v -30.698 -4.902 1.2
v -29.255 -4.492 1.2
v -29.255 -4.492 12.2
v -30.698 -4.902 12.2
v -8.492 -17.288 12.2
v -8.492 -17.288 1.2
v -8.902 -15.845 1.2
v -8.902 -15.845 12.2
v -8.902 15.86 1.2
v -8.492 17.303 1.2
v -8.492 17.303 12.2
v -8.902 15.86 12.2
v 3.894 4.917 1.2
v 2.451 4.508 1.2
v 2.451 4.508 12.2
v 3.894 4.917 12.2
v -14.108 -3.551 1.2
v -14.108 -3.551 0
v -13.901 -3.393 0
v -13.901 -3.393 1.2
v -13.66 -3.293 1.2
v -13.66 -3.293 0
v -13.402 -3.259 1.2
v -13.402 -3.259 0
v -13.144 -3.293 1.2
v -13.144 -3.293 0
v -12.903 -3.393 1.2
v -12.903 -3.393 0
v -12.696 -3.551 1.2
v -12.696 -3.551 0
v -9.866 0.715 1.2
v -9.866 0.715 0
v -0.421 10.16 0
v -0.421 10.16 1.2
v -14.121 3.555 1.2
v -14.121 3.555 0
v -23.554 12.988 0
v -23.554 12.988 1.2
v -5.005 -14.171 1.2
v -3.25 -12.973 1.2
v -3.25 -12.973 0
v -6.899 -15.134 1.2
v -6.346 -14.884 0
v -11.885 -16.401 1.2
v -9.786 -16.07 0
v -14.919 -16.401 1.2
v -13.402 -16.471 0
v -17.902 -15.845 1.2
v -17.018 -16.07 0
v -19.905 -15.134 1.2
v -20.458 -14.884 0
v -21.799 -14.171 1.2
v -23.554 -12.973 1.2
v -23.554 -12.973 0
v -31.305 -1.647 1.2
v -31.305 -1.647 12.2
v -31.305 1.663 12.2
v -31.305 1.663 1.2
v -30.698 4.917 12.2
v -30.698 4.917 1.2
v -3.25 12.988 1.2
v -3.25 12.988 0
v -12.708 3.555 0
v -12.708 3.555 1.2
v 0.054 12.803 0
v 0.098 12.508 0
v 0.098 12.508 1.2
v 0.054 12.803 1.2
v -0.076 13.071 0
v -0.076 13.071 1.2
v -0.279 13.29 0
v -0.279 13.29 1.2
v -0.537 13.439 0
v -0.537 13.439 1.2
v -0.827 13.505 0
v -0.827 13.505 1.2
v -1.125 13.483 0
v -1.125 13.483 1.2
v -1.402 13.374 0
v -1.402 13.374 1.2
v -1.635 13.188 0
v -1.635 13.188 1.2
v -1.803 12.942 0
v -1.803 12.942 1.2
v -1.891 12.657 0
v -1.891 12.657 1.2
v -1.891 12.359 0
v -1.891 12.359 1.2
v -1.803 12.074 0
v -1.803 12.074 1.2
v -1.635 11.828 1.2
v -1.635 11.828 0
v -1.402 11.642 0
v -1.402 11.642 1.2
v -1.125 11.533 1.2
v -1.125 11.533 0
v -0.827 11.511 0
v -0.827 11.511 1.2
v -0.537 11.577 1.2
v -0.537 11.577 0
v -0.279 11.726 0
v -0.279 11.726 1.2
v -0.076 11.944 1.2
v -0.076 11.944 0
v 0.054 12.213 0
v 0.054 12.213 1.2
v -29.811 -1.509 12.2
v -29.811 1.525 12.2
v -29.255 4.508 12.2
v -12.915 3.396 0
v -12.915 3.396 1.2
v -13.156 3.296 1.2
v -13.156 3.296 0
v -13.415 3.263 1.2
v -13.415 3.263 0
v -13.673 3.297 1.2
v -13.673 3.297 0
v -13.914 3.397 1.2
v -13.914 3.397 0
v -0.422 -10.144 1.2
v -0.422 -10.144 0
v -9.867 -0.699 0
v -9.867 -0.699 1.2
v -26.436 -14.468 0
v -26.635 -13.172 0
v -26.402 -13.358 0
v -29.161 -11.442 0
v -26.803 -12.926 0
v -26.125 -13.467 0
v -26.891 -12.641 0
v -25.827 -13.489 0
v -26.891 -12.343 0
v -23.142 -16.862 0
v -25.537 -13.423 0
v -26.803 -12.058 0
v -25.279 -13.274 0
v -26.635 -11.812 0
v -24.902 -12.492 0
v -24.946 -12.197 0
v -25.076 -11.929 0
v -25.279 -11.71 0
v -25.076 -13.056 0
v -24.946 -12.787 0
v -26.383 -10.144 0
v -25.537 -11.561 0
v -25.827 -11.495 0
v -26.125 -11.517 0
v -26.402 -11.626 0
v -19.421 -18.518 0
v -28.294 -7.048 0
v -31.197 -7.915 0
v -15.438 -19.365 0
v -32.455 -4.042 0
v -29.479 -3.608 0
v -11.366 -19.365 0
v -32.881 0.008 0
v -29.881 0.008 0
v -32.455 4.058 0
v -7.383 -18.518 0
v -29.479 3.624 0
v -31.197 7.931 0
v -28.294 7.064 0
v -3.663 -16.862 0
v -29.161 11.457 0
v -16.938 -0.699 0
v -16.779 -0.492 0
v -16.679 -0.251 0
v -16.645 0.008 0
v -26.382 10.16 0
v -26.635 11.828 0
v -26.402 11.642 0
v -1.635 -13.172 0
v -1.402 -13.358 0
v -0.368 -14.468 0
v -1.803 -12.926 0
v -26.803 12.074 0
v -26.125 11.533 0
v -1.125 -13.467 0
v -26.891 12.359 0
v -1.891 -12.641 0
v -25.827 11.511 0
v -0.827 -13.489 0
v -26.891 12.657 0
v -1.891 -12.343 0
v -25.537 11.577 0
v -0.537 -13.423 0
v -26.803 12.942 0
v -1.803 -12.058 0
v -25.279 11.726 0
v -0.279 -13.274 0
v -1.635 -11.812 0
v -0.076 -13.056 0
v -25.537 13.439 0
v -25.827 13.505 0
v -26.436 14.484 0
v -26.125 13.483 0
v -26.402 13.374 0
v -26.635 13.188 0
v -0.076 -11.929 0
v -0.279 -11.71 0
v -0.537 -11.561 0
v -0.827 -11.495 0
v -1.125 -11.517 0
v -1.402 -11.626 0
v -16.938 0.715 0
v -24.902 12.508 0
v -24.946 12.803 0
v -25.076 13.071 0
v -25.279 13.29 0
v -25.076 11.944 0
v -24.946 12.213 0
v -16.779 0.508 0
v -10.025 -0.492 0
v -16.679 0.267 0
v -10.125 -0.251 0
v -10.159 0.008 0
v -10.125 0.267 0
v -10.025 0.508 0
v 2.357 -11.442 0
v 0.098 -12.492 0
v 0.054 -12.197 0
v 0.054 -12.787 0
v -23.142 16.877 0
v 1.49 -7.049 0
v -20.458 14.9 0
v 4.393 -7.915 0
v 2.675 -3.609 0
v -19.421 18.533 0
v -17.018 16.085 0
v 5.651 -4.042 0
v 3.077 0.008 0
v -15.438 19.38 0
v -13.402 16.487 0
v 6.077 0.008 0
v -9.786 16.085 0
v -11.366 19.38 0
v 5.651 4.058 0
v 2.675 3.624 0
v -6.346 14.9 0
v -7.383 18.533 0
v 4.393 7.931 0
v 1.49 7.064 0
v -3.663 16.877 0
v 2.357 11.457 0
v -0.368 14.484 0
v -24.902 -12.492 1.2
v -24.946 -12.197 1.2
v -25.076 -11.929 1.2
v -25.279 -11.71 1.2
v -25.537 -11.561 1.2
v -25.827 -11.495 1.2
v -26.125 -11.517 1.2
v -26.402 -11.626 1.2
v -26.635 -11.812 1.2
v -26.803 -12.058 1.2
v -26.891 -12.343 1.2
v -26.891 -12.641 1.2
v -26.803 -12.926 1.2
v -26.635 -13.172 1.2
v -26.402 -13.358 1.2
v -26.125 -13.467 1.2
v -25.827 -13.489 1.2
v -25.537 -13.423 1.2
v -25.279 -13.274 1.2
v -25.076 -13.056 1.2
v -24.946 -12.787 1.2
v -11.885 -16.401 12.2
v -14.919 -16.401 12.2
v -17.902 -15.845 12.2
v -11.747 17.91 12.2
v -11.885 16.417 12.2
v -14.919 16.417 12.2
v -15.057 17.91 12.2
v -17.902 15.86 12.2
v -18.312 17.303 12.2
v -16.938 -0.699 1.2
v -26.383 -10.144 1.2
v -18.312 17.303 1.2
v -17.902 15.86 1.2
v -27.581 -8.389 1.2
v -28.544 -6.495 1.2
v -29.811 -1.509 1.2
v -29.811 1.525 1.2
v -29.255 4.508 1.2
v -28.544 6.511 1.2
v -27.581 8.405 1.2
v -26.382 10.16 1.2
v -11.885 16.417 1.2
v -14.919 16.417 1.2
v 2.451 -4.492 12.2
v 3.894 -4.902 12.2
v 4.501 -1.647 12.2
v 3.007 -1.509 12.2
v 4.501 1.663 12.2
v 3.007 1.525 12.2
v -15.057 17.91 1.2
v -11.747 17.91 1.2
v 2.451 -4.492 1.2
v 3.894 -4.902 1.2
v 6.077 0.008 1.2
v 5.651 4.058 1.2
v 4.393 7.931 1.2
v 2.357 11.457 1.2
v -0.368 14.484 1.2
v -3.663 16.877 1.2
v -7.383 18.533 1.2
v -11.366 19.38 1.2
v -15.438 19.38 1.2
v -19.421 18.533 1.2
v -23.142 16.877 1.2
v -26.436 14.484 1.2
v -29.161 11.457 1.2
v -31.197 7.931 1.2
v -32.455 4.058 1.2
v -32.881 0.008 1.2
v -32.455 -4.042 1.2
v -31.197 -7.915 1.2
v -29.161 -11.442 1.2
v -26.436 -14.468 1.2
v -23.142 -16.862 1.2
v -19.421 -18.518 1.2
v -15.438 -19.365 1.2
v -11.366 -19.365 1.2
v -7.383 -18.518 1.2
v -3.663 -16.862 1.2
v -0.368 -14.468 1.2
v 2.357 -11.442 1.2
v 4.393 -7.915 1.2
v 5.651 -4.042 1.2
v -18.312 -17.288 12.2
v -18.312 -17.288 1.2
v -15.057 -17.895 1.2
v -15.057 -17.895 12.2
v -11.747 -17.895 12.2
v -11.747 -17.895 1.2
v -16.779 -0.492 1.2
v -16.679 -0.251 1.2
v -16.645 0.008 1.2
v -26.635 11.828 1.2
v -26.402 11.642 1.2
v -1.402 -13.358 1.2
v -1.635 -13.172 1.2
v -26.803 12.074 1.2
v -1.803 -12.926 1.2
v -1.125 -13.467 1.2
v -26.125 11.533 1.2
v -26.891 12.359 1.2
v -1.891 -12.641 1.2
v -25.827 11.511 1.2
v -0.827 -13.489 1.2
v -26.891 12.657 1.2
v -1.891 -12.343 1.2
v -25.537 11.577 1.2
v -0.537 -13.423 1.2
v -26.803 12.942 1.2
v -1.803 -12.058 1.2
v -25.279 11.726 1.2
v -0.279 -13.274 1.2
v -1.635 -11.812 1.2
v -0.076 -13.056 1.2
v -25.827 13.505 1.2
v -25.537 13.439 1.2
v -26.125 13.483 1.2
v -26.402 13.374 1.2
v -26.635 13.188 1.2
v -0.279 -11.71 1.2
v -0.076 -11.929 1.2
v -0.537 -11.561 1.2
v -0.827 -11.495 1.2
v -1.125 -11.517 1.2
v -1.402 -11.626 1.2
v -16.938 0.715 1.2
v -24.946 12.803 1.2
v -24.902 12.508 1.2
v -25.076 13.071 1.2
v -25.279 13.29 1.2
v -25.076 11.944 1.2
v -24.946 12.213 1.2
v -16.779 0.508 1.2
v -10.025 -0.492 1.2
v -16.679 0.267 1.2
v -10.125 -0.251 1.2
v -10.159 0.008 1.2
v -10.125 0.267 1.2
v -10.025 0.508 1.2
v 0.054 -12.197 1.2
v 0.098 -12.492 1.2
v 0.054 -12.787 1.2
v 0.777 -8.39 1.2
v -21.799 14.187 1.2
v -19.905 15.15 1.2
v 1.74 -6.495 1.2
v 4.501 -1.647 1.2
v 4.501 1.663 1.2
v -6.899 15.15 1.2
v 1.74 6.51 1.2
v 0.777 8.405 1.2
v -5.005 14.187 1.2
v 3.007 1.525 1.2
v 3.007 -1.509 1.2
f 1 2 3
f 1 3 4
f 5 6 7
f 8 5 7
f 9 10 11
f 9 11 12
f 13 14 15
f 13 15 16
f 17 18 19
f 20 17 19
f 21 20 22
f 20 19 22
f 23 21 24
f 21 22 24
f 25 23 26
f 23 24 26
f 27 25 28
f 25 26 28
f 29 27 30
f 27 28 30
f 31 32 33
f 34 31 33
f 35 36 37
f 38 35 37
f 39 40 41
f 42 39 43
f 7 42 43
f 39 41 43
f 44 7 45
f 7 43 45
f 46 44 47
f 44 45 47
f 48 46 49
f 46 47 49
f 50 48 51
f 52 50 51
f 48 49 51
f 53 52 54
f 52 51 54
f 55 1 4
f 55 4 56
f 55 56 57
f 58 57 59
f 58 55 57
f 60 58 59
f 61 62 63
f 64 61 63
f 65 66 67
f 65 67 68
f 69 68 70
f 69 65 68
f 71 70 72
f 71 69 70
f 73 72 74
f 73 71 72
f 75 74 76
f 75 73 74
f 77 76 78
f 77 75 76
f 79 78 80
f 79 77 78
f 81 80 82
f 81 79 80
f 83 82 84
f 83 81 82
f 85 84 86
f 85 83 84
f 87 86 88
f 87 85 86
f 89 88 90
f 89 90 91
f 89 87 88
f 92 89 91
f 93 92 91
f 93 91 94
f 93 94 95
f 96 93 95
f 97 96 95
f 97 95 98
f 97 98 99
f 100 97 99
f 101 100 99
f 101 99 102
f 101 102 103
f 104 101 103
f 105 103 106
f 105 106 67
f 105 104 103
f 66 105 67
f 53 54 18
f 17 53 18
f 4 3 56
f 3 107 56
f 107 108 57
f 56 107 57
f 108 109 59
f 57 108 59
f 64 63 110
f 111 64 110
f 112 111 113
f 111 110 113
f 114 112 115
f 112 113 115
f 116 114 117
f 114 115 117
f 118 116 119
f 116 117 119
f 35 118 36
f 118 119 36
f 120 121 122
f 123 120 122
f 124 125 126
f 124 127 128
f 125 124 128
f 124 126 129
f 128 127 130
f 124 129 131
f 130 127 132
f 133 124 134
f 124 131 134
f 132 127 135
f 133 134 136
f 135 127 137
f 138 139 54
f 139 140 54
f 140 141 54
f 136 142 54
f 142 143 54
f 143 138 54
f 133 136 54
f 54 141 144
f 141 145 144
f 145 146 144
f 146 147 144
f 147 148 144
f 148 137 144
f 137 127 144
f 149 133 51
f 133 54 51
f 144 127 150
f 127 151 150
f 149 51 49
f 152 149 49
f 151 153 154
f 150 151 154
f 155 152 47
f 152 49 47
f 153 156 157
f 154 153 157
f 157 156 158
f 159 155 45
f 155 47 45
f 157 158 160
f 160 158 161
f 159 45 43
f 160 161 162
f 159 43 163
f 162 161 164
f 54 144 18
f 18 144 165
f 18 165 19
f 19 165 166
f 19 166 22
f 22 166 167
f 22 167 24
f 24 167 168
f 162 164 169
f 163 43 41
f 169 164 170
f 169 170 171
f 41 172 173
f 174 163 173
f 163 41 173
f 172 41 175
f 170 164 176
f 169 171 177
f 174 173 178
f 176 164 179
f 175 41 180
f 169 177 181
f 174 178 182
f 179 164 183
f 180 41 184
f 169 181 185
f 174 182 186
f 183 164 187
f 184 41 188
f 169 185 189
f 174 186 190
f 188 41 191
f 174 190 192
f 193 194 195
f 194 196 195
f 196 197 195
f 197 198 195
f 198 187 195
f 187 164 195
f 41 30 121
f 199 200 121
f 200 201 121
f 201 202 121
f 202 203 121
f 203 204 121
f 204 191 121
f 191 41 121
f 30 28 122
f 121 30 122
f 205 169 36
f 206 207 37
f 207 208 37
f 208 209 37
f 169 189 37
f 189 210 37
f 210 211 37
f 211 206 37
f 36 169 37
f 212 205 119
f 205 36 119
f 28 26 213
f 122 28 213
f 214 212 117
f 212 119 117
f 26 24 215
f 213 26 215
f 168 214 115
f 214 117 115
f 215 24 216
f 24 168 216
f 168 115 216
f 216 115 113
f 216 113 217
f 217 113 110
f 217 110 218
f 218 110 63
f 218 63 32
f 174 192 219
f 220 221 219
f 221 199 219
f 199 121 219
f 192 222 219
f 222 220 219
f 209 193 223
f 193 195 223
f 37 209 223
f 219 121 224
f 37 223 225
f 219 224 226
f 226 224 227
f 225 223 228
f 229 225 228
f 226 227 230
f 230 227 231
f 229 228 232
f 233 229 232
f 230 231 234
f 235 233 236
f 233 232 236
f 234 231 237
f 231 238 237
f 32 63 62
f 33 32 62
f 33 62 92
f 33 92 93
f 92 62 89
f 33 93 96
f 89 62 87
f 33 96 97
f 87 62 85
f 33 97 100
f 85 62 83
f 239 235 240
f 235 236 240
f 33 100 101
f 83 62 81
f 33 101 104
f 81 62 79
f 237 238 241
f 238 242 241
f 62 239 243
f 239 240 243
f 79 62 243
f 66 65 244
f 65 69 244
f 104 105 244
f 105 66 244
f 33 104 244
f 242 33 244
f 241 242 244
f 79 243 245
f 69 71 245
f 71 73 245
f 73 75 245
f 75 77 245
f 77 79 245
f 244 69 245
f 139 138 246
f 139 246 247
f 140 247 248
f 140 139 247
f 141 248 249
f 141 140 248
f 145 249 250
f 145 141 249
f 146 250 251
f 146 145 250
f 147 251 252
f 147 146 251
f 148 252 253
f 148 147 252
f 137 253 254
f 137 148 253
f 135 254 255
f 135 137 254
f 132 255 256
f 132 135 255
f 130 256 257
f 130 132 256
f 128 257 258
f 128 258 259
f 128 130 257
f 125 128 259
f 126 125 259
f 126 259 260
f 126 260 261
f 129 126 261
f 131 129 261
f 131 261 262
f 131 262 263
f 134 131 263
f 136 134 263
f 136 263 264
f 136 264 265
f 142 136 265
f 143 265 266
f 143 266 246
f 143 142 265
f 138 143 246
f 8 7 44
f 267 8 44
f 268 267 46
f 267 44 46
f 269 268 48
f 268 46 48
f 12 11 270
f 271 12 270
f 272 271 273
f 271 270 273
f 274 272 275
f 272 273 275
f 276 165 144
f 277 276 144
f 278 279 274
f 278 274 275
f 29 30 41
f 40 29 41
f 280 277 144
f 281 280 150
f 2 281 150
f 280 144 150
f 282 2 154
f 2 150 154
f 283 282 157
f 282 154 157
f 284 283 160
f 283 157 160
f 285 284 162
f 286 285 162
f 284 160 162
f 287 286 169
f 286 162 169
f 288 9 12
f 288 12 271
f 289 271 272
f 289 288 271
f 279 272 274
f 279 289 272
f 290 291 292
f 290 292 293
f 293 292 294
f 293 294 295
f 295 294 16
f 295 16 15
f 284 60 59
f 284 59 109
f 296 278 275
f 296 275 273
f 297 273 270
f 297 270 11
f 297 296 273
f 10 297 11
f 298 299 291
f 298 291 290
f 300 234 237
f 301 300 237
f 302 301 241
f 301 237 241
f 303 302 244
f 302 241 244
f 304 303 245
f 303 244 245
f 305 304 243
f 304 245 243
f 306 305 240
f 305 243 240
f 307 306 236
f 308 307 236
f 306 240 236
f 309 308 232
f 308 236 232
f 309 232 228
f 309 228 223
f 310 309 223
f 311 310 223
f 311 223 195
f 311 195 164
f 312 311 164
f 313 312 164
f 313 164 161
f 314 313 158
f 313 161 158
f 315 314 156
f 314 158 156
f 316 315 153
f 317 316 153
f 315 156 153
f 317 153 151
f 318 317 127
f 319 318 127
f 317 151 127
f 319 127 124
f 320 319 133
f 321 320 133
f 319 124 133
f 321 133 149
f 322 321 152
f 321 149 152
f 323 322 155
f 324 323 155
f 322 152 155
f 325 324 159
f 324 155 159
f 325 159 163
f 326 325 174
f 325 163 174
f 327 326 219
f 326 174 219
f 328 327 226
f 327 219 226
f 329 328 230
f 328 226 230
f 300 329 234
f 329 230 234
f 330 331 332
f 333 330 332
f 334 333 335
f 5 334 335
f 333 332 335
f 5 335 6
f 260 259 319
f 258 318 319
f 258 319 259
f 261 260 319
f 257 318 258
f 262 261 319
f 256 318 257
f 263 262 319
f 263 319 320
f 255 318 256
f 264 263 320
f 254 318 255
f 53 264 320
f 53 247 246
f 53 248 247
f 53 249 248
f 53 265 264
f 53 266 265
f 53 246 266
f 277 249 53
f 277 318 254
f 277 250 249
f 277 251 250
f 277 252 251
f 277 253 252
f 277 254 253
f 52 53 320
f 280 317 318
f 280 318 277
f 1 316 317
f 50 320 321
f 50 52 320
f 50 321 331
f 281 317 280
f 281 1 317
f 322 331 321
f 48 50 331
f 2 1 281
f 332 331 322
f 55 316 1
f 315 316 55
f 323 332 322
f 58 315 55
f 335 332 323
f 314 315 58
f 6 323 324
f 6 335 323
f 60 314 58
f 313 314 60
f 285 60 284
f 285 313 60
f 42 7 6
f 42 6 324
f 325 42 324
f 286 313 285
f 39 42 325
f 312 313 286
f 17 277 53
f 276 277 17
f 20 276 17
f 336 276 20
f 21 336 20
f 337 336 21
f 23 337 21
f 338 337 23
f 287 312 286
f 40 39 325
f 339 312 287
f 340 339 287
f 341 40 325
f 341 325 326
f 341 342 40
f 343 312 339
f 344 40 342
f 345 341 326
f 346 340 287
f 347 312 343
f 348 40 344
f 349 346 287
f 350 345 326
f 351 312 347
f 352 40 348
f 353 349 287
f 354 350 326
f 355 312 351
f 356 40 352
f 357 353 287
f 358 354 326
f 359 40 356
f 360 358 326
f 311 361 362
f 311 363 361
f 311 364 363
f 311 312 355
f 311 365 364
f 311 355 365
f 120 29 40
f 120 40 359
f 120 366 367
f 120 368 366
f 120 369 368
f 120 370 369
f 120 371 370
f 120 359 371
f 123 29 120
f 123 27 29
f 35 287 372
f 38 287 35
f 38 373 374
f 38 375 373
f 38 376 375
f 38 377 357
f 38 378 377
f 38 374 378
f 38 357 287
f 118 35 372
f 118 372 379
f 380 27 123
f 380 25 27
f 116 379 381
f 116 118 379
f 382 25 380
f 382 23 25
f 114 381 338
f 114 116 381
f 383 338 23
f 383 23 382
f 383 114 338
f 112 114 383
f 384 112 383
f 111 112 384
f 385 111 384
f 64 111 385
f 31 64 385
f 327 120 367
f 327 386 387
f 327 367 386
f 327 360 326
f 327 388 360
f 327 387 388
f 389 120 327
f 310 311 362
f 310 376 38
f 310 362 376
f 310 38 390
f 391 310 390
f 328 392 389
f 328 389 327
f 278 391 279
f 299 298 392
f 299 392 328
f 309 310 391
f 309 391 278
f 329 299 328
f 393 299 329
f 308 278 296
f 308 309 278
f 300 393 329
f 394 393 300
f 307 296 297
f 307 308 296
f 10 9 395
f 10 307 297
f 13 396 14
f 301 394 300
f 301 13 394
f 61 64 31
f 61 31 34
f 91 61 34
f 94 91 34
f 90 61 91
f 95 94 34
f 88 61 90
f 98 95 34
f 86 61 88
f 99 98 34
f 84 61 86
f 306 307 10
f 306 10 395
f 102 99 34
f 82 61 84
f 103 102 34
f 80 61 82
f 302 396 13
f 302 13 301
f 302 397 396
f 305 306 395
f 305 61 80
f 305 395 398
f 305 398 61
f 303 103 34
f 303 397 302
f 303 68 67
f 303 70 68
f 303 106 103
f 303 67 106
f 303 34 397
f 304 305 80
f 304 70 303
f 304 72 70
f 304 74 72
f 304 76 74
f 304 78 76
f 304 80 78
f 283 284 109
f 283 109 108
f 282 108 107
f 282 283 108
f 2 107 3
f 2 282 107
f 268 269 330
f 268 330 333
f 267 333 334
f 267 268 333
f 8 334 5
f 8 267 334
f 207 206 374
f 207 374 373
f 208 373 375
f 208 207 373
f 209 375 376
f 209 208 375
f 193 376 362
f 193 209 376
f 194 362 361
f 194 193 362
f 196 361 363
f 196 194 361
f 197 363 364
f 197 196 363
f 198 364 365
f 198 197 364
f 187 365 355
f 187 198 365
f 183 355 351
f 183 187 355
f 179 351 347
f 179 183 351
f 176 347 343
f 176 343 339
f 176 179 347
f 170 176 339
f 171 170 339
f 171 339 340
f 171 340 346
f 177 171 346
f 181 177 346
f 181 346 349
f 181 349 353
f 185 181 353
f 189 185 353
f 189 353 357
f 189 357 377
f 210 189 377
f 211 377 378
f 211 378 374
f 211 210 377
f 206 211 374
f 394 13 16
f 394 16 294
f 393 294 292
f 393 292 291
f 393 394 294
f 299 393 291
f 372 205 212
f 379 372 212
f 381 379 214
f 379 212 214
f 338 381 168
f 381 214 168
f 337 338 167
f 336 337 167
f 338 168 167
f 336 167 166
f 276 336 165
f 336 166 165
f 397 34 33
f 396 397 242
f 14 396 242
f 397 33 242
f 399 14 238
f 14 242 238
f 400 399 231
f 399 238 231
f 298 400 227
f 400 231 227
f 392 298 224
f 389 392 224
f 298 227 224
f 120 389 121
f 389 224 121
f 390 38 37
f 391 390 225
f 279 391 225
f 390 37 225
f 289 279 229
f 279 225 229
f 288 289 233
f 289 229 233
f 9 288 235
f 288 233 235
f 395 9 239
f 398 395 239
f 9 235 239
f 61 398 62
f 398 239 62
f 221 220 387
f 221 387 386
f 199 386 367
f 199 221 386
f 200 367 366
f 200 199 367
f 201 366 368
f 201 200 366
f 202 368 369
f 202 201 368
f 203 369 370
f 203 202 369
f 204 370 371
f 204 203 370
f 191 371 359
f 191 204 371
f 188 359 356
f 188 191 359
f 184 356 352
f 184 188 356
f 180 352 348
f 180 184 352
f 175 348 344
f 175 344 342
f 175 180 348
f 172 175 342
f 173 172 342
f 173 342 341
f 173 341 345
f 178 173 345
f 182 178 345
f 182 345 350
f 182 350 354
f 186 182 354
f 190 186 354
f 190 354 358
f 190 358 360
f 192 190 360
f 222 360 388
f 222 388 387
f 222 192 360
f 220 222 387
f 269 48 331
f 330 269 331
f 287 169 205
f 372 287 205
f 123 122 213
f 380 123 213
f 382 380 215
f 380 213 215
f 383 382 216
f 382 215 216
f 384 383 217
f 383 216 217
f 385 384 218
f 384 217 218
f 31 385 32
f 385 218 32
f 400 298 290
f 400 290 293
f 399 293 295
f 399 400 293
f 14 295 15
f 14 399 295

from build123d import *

# Parameters (mm, degrees)
SKETCH_4_R      = 19.479021456
SKETCH_4_R_2    = 1
EXTRUDE_1_DEPTH = 1.2
EXTRUDE_2_DEPTH = 11


with BuildPart() as part:
    # 草图4 → 凸台-拉伸1 (new body)
    with BuildSketch(Plane.XY):
        with Locations((-13.402062784, 0.00779119)):
            Circle(SKETCH_4_R)
        with Locations((-25.902062784, 12.50779119)):
            Circle(SKETCH_4_R_2, mode=Mode.SUBTRACT)
        with Locations((-0.902062784, 12.50779119)):
            Circle(SKETCH_4_R_2, mode=Mode.SUBTRACT)
        with Locations((-0.902062784, -12.49220881)):
            Circle(SKETCH_4_R_2, mode=Mode.SUBTRACT)
        with Locations((-25.902062784, -12.49220881)):
            Circle(SKETCH_4_R_2, mode=Mode.SUBTRACT)
        with BuildLine():
            Line((-0.421681224, -10.144442196), (-9.866508066, -0.699336529))
            ThreePointArc((-9.866508066, -0.699336529), (-10.159390847, 0.007774575), (-9.866487191, 0.714877033))
            Line((-9.866487191, 0.714877033), (-0.421408953, 10.159676447))
            ThreePointArc((-0.421408953, 10.159676447), (3.076958671, 0.007570212), (-0.421681224, -10.144442196))
        make_face(mode=Mode.SUBTRACT)
        with BuildLine():
            Line((-3.249794328, 12.988145321), (-12.707997878, 3.55452659))
            ThreePointArc((-12.707997878, 3.55452659), (-13.414834543, 3.262553175), (-14.121290651, 3.555446182))
            Line((-14.121290651, 3.555446182), (-23.554139641, 12.988295172))
            ThreePointArc((-23.554139641, 12.988295172), (-13.401941164, 16.486812646), (-3.249794328, 12.988145321))
        make_face(mode=Mode.SUBTRACT)
        with BuildLine():
            Line((-26.382444344, 10.160024576), (-16.937617502, 0.714918908))
            ThreePointArc((-16.937617502, 0.714918908), (-16.64473472, 0.007807804), (-16.937638376, -0.699294654))
            Line((-16.937638376, -0.699294654), (-26.382716615, -10.144094068))
            ThreePointArc((-26.382716615, -10.144094068), (-29.881084239, 0.008012168), (-26.382444344, 10.160024576))
        make_face(mode=Mode.SUBTRACT)
        with BuildLine():
            Line((-23.554331239, -12.972562941), (-14.108248776, -3.55103379))
            ThreePointArc((-14.108248776, -3.55103379), (-13.402062784, -3.259060163), (-12.695876792, -3.55103379))
            Line((-12.695876792, -3.55103379), (-3.249794328, -12.972562941))
            ThreePointArc((-3.249794328, -12.972562941), (-13.402062784, -16.471230267), (-23.554331239, -12.972562941))
        make_face(mode=Mode.SUBTRACT)
    extrude(amount=EXTRUDE_1_DEPTH)

    # 草图5 → 凸台-拉伸2 (add)
    with BuildSketch(Plane.XY.offset(1.2)):
        with BuildLine():
            Line((-17.902062784, -15.844910415), (-18.311674484, -17.287899762))
            ThreePointArc((-18.311674484, -17.287899762), (-13.402062784, -17.971230267), (-8.492451083, -17.287899762))
            Line((-8.492451083, -17.287899762), (-8.902062784, -15.844910415))
            ThreePointArc((-8.902062784, -15.844910415), (-13.402062784, -16.471230267), (-17.902062784, -15.844910415))
        make_face()
        with BuildLine():
            Line((-29.254764388, -4.49220881), (-30.697753735, -4.901820511))
            ThreePointArc((-30.697753735, -4.901820511), (-31.38108424, 0.00779119), (-30.697753735, 4.91740289))
            Line((-30.697753735, 4.91740289), (-29.254764388, 4.50779119))
            ThreePointArc((-29.254764388, 4.50779119), (-29.88108424, 0.00779119), (-29.254764388, -4.49220881))
        make_face()
        with BuildLine():
            Line((-17.902062784, 15.860492794), (-18.311674484, 17.303482141))
            ThreePointArc((-18.311674484, 17.303482141), (-13.402062784, 17.986812646), (-8.492451083, 17.303482141))
            Line((-8.492451083, 17.303482141), (-8.902062784, 15.860492794))
            ThreePointArc((-8.902062784, 15.860492794), (-13.402062784, 16.486812646), (-17.902062784, 15.860492794))
        make_face()
        with BuildLine():
            Line((2.450638821, 4.50779119), (3.893628168, 4.91740289))
            ThreePointArc((3.893628168, 4.91740289), (4.576958673, 0.00779119), (3.893628168, -4.901820511))
            Line((3.893628168, -4.901820511), (2.450638821, -4.49220881))
            ThreePointArc((2.450638821, -4.49220881), (3.076958673, 0.00779119), (2.450638821, 4.50779119))
        make_face()
    extrude(amount=EXTRUDE_2_DEPTH)


solid = part.part
